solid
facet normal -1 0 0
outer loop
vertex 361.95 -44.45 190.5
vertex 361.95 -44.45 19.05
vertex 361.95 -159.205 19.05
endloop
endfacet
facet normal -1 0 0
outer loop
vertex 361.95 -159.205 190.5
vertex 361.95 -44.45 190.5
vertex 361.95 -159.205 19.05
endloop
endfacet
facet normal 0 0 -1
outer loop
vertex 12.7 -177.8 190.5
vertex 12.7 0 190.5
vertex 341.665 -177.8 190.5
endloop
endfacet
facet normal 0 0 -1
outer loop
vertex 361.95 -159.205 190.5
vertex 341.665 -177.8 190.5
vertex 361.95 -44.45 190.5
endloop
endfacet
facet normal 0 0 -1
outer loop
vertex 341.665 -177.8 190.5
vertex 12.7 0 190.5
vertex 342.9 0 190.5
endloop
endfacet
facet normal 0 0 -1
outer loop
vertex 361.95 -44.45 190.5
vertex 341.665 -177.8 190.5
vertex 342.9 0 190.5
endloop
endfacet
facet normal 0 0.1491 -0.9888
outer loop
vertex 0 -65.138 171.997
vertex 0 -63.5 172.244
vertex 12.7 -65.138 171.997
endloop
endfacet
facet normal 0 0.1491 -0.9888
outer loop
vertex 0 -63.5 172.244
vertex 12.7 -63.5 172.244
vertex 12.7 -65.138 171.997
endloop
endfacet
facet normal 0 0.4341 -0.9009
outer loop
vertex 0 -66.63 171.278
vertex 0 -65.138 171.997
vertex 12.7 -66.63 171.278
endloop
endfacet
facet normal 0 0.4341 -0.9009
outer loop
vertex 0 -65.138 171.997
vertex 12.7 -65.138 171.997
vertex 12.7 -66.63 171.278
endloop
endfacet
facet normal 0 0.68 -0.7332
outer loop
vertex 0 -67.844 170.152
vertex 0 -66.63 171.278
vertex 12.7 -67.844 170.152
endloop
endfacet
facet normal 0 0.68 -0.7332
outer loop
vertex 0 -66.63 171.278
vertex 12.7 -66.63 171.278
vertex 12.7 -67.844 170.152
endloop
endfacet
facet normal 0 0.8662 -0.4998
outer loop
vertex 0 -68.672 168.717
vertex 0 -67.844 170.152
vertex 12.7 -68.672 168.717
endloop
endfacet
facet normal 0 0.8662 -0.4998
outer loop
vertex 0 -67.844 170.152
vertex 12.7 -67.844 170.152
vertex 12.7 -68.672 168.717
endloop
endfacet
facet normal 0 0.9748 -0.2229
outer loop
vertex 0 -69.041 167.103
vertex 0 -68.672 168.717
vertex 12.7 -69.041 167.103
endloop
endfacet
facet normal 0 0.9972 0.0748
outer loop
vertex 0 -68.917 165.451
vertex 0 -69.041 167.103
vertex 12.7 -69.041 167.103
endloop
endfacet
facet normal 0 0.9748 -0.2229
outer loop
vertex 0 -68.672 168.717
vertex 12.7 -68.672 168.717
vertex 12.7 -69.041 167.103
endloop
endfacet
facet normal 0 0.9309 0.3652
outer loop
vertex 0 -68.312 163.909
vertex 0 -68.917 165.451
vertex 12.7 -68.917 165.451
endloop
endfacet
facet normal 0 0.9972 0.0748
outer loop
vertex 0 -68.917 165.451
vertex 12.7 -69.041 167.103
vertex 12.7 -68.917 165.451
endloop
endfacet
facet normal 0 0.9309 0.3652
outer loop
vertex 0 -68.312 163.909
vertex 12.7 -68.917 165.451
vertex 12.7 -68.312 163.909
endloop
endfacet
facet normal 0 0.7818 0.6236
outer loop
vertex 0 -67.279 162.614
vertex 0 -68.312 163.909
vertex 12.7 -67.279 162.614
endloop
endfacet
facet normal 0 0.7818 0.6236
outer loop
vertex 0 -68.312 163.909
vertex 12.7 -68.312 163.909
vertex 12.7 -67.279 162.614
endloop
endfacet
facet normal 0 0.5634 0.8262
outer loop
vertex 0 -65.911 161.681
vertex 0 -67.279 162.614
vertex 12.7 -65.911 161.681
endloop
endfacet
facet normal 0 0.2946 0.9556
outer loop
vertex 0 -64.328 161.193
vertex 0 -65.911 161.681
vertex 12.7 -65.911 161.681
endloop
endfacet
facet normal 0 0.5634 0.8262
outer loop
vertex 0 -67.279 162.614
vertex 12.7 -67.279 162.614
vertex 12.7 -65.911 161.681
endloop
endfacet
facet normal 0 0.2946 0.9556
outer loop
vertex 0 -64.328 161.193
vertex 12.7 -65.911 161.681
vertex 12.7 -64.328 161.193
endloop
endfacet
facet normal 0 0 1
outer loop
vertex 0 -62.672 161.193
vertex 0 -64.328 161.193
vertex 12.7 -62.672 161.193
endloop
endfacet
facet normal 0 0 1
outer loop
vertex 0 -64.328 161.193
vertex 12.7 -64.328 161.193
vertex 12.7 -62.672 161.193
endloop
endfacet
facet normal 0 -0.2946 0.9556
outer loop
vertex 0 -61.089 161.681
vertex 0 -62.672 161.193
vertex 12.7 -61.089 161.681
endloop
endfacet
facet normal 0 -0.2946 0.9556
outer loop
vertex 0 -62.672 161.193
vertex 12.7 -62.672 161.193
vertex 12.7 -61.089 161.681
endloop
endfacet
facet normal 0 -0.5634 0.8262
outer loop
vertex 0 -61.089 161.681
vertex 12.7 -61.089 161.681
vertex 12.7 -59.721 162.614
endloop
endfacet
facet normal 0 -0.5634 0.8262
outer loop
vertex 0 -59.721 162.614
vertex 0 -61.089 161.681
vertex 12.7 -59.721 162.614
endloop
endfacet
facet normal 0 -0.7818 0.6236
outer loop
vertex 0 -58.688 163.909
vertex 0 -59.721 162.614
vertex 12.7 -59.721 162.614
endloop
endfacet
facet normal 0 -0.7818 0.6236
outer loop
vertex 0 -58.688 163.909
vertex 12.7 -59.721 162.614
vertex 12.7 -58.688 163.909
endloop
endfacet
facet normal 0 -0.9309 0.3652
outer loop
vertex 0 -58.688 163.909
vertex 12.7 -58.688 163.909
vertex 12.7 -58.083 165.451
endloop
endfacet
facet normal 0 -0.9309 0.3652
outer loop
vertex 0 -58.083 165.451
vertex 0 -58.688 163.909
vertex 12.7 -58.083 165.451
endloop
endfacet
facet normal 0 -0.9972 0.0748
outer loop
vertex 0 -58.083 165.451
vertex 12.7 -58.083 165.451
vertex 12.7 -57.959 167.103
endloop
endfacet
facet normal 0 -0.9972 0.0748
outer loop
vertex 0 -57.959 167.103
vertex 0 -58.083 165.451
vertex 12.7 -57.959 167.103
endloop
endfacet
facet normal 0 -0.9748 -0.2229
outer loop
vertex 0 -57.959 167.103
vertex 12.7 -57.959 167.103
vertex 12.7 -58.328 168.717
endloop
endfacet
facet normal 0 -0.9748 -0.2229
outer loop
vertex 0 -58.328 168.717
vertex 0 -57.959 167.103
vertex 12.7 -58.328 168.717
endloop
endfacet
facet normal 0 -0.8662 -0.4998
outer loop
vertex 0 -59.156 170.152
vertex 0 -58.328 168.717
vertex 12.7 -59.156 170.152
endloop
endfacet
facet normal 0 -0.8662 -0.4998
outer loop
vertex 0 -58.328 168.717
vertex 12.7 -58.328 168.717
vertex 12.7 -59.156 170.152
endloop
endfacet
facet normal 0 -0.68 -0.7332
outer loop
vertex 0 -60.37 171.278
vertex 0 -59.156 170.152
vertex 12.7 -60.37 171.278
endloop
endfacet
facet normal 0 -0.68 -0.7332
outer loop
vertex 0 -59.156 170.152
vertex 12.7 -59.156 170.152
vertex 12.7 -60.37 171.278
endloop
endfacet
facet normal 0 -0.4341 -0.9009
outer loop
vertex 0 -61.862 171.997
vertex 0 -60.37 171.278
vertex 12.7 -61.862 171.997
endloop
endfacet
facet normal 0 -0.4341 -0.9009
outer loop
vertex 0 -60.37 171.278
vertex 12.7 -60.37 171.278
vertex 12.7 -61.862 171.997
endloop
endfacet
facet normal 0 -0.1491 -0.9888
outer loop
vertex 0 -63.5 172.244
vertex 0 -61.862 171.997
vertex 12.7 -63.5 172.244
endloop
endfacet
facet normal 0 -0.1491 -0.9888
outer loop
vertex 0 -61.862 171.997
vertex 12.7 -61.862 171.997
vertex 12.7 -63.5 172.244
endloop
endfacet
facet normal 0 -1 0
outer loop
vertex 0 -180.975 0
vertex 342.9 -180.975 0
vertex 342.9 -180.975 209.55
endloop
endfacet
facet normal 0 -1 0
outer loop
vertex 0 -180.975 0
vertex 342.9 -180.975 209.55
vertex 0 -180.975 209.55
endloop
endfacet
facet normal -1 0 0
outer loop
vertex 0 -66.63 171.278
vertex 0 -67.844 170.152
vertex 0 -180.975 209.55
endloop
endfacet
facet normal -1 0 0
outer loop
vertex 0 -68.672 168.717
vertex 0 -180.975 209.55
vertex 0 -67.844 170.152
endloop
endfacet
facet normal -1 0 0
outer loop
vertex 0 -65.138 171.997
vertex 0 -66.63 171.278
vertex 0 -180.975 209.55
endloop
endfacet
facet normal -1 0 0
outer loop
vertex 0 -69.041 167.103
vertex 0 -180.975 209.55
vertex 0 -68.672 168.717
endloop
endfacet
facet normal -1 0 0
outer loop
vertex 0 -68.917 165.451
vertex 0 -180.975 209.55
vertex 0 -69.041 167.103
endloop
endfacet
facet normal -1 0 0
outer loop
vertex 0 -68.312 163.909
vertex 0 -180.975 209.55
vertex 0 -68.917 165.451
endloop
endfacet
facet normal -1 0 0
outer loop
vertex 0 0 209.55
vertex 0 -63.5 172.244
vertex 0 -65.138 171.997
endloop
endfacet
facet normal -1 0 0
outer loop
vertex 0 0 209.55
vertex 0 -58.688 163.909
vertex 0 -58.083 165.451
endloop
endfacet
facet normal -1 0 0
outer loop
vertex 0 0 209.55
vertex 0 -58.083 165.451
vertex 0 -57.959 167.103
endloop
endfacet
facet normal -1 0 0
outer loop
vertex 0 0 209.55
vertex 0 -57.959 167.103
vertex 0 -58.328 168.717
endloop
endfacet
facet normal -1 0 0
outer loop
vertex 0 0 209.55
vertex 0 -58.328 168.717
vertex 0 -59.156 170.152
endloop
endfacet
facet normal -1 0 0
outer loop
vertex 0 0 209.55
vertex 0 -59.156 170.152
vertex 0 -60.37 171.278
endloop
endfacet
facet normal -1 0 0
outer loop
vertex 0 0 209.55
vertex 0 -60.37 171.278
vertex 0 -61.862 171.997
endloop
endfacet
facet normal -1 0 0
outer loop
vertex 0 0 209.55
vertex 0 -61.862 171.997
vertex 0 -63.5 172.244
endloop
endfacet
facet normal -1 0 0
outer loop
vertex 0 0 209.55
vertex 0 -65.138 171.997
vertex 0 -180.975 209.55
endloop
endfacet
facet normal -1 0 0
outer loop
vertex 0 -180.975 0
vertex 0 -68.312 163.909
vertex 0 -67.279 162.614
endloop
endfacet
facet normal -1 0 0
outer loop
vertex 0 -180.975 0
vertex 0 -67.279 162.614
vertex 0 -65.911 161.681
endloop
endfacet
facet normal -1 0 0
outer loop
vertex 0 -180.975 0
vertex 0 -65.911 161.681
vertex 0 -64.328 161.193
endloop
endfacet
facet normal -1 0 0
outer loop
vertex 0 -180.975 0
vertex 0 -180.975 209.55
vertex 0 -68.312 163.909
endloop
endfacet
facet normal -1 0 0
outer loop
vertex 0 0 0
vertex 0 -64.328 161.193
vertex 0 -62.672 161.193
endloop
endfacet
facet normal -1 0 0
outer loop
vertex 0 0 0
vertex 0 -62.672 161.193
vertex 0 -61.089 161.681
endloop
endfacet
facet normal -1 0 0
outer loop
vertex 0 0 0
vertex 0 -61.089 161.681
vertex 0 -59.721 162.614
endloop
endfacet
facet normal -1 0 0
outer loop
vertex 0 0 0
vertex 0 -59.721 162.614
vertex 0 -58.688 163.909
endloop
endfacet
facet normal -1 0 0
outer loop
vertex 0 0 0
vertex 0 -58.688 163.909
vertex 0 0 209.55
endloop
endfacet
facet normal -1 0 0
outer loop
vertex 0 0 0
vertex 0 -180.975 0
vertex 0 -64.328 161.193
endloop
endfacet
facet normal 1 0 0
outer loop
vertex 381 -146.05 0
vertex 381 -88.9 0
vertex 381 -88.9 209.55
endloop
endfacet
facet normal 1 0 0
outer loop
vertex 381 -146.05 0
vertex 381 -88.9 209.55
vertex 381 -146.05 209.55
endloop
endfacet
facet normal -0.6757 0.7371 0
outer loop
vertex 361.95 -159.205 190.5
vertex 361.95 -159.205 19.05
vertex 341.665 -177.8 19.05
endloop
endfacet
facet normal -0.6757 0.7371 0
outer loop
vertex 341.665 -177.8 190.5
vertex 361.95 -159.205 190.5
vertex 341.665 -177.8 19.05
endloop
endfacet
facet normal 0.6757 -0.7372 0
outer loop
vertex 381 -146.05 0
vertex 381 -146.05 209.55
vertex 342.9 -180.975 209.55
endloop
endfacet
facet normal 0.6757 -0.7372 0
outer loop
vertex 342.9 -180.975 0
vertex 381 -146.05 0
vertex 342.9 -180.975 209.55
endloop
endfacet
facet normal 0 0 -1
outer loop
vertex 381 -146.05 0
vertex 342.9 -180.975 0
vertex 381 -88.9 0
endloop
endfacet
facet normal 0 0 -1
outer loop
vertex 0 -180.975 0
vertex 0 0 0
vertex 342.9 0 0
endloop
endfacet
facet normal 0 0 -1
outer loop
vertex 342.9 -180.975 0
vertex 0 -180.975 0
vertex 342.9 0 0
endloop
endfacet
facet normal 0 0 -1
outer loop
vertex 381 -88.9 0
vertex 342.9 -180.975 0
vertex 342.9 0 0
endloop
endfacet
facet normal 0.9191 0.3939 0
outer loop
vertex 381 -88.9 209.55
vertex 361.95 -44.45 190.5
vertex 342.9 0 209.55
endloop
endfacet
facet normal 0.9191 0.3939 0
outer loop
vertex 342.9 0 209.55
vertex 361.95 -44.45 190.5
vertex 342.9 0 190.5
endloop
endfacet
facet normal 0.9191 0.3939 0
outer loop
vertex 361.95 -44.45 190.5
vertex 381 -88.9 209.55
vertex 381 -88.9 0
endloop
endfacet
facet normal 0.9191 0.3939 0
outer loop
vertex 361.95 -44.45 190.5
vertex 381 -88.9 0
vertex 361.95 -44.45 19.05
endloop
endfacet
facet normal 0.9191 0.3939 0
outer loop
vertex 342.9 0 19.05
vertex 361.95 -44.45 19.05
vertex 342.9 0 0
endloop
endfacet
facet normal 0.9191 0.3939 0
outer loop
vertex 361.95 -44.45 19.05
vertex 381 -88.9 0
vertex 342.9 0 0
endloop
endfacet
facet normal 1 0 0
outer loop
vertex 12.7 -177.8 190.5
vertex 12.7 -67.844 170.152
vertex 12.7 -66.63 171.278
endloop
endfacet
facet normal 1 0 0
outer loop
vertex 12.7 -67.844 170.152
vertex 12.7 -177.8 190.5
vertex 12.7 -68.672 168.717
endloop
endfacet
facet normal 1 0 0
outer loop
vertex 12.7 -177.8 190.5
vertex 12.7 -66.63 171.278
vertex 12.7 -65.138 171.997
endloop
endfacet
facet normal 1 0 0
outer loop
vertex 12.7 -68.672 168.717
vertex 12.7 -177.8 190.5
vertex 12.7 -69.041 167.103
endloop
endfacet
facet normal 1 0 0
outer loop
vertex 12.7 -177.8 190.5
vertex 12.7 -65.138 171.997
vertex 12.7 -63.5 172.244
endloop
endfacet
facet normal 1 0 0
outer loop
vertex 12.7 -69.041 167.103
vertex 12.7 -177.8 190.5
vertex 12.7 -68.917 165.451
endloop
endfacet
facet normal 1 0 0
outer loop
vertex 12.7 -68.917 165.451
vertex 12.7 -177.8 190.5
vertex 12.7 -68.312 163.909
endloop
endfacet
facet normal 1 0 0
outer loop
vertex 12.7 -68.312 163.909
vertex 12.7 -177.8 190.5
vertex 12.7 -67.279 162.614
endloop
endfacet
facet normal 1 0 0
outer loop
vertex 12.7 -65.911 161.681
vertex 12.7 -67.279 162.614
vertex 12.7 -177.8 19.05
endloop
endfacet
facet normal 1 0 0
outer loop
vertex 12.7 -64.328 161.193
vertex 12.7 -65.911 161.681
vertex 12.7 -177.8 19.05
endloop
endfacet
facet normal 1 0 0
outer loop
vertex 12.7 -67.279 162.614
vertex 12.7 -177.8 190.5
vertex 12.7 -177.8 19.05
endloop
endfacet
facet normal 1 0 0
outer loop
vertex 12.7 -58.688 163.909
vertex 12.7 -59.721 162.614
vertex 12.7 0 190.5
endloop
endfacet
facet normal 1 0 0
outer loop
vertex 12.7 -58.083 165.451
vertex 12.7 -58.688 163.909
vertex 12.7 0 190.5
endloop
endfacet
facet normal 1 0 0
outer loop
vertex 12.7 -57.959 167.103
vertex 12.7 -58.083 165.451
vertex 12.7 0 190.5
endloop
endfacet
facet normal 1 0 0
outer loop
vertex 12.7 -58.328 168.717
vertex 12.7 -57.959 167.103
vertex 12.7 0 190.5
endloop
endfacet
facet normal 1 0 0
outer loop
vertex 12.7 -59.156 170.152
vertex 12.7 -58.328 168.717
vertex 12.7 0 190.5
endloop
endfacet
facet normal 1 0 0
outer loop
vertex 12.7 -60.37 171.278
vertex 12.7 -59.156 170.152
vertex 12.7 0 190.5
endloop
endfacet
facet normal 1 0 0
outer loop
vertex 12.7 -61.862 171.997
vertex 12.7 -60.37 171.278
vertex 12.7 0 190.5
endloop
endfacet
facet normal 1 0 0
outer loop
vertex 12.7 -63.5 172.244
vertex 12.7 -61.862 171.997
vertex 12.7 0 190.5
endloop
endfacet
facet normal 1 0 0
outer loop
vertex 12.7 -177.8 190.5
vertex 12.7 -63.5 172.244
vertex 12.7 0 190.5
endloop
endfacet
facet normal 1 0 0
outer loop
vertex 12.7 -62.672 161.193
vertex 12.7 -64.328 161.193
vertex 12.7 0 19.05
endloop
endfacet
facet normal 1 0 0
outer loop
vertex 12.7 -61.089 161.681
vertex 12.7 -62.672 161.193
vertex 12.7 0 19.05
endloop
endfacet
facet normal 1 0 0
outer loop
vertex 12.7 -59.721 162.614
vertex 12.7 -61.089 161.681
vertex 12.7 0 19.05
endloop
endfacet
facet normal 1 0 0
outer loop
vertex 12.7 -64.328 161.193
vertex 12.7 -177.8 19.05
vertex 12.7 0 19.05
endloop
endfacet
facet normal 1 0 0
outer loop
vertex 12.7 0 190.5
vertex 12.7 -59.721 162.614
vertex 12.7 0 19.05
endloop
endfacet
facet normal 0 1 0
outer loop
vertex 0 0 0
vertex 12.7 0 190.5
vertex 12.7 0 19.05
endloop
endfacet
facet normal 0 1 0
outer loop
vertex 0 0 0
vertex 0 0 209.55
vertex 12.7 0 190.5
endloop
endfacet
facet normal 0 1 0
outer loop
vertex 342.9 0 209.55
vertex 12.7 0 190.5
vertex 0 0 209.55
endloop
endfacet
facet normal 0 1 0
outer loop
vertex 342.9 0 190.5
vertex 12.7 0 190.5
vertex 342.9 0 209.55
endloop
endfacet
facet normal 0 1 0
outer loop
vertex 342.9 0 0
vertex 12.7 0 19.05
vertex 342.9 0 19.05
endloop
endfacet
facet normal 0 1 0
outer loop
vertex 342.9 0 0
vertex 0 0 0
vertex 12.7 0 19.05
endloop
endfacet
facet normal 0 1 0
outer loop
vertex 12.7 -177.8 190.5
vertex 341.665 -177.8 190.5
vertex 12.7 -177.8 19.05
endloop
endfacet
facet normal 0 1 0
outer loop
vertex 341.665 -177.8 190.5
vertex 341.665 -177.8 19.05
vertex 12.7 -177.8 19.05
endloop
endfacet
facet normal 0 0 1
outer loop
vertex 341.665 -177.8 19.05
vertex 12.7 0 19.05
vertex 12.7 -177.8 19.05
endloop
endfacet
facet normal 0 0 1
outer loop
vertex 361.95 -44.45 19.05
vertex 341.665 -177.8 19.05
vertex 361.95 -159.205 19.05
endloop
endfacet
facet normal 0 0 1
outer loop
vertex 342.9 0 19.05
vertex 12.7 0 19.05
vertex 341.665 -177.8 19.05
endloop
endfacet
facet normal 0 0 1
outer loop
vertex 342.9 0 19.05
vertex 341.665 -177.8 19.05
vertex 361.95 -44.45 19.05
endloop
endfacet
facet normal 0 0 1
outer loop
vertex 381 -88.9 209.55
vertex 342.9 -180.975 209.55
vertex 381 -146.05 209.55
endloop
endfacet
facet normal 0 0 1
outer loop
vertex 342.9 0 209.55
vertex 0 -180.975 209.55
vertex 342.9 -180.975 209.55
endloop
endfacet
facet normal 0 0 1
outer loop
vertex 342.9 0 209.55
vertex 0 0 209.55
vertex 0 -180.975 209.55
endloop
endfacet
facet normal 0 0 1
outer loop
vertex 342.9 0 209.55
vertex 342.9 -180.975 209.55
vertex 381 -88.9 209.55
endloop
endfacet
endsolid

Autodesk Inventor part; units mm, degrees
ref_plane "YZ Plane" through (0, 0, 0) normal (1, 0, 0) x (0, 1, 0)
ref_plane "XZ Plane" through (0, 0, 0) normal (0, 1, 0) x (-1, 0, 0)
ref_plane "XY Plane" through (0, 0, 0) normal (0, 0, 1) x (1, 0, 0)
sketch "Sketch1" plane through (0, 0, 0) normal (0, 0, 1) x (1, 0, 0)
  line L0 (0, 0) -> (342.9, 0)
  line L1 (342.9, 0) -> (342.9, -180.975)
  line L2 (342.9, -180.975) -> (0, -180.975)
  line L3 (0, -180.975) -> (0, 0)
  line L4 (342.9, -88.9) -> (381, -88.9)
  line L5 (381, -88.9) -> (381, -146.05)
  line L6 (381, -146.05) -> (342.9, -146.05)
  line L7 (342.9, -146.05) -> (342.9, -88.9)
  line L8 (381, -146.05) -> (342.9, -180.975)
  line L9 (381, -88.9) -> (342.9, 0)
  dimension "d0" = 342.9
  dimension "d1" = 180.975
  dimension "d2" = 88.9
  dimension "d3" = 34.925
  dimension "d4" = 38.1
extrude "Extrusion1" add sketch "Sketch1" along normal blind 209.55
shell "Shell1" thickness 19.05 removed faces 2 at (228.6, 0, 69.85) at (355.6, -29.6333, 139.7) ; own thickness 19.05 on faces at (114.3, -60.325, 209.55) (381, -127, 69.85) (114.3, -60.325, 0) ; own thickness 12.7 on faces at (0, -60.325, 69.85) ; own thickness 3.175 on faces at (114.3, -180.975, 69.85) (355.6, -169.3333, 69.85)
hole "Hole1" at (0, -63.5, 166.6875) direction (1, 0, 0) diameter 11.1125 end up to surface
properties part number "bin" material "Thermoplastic Resin"
